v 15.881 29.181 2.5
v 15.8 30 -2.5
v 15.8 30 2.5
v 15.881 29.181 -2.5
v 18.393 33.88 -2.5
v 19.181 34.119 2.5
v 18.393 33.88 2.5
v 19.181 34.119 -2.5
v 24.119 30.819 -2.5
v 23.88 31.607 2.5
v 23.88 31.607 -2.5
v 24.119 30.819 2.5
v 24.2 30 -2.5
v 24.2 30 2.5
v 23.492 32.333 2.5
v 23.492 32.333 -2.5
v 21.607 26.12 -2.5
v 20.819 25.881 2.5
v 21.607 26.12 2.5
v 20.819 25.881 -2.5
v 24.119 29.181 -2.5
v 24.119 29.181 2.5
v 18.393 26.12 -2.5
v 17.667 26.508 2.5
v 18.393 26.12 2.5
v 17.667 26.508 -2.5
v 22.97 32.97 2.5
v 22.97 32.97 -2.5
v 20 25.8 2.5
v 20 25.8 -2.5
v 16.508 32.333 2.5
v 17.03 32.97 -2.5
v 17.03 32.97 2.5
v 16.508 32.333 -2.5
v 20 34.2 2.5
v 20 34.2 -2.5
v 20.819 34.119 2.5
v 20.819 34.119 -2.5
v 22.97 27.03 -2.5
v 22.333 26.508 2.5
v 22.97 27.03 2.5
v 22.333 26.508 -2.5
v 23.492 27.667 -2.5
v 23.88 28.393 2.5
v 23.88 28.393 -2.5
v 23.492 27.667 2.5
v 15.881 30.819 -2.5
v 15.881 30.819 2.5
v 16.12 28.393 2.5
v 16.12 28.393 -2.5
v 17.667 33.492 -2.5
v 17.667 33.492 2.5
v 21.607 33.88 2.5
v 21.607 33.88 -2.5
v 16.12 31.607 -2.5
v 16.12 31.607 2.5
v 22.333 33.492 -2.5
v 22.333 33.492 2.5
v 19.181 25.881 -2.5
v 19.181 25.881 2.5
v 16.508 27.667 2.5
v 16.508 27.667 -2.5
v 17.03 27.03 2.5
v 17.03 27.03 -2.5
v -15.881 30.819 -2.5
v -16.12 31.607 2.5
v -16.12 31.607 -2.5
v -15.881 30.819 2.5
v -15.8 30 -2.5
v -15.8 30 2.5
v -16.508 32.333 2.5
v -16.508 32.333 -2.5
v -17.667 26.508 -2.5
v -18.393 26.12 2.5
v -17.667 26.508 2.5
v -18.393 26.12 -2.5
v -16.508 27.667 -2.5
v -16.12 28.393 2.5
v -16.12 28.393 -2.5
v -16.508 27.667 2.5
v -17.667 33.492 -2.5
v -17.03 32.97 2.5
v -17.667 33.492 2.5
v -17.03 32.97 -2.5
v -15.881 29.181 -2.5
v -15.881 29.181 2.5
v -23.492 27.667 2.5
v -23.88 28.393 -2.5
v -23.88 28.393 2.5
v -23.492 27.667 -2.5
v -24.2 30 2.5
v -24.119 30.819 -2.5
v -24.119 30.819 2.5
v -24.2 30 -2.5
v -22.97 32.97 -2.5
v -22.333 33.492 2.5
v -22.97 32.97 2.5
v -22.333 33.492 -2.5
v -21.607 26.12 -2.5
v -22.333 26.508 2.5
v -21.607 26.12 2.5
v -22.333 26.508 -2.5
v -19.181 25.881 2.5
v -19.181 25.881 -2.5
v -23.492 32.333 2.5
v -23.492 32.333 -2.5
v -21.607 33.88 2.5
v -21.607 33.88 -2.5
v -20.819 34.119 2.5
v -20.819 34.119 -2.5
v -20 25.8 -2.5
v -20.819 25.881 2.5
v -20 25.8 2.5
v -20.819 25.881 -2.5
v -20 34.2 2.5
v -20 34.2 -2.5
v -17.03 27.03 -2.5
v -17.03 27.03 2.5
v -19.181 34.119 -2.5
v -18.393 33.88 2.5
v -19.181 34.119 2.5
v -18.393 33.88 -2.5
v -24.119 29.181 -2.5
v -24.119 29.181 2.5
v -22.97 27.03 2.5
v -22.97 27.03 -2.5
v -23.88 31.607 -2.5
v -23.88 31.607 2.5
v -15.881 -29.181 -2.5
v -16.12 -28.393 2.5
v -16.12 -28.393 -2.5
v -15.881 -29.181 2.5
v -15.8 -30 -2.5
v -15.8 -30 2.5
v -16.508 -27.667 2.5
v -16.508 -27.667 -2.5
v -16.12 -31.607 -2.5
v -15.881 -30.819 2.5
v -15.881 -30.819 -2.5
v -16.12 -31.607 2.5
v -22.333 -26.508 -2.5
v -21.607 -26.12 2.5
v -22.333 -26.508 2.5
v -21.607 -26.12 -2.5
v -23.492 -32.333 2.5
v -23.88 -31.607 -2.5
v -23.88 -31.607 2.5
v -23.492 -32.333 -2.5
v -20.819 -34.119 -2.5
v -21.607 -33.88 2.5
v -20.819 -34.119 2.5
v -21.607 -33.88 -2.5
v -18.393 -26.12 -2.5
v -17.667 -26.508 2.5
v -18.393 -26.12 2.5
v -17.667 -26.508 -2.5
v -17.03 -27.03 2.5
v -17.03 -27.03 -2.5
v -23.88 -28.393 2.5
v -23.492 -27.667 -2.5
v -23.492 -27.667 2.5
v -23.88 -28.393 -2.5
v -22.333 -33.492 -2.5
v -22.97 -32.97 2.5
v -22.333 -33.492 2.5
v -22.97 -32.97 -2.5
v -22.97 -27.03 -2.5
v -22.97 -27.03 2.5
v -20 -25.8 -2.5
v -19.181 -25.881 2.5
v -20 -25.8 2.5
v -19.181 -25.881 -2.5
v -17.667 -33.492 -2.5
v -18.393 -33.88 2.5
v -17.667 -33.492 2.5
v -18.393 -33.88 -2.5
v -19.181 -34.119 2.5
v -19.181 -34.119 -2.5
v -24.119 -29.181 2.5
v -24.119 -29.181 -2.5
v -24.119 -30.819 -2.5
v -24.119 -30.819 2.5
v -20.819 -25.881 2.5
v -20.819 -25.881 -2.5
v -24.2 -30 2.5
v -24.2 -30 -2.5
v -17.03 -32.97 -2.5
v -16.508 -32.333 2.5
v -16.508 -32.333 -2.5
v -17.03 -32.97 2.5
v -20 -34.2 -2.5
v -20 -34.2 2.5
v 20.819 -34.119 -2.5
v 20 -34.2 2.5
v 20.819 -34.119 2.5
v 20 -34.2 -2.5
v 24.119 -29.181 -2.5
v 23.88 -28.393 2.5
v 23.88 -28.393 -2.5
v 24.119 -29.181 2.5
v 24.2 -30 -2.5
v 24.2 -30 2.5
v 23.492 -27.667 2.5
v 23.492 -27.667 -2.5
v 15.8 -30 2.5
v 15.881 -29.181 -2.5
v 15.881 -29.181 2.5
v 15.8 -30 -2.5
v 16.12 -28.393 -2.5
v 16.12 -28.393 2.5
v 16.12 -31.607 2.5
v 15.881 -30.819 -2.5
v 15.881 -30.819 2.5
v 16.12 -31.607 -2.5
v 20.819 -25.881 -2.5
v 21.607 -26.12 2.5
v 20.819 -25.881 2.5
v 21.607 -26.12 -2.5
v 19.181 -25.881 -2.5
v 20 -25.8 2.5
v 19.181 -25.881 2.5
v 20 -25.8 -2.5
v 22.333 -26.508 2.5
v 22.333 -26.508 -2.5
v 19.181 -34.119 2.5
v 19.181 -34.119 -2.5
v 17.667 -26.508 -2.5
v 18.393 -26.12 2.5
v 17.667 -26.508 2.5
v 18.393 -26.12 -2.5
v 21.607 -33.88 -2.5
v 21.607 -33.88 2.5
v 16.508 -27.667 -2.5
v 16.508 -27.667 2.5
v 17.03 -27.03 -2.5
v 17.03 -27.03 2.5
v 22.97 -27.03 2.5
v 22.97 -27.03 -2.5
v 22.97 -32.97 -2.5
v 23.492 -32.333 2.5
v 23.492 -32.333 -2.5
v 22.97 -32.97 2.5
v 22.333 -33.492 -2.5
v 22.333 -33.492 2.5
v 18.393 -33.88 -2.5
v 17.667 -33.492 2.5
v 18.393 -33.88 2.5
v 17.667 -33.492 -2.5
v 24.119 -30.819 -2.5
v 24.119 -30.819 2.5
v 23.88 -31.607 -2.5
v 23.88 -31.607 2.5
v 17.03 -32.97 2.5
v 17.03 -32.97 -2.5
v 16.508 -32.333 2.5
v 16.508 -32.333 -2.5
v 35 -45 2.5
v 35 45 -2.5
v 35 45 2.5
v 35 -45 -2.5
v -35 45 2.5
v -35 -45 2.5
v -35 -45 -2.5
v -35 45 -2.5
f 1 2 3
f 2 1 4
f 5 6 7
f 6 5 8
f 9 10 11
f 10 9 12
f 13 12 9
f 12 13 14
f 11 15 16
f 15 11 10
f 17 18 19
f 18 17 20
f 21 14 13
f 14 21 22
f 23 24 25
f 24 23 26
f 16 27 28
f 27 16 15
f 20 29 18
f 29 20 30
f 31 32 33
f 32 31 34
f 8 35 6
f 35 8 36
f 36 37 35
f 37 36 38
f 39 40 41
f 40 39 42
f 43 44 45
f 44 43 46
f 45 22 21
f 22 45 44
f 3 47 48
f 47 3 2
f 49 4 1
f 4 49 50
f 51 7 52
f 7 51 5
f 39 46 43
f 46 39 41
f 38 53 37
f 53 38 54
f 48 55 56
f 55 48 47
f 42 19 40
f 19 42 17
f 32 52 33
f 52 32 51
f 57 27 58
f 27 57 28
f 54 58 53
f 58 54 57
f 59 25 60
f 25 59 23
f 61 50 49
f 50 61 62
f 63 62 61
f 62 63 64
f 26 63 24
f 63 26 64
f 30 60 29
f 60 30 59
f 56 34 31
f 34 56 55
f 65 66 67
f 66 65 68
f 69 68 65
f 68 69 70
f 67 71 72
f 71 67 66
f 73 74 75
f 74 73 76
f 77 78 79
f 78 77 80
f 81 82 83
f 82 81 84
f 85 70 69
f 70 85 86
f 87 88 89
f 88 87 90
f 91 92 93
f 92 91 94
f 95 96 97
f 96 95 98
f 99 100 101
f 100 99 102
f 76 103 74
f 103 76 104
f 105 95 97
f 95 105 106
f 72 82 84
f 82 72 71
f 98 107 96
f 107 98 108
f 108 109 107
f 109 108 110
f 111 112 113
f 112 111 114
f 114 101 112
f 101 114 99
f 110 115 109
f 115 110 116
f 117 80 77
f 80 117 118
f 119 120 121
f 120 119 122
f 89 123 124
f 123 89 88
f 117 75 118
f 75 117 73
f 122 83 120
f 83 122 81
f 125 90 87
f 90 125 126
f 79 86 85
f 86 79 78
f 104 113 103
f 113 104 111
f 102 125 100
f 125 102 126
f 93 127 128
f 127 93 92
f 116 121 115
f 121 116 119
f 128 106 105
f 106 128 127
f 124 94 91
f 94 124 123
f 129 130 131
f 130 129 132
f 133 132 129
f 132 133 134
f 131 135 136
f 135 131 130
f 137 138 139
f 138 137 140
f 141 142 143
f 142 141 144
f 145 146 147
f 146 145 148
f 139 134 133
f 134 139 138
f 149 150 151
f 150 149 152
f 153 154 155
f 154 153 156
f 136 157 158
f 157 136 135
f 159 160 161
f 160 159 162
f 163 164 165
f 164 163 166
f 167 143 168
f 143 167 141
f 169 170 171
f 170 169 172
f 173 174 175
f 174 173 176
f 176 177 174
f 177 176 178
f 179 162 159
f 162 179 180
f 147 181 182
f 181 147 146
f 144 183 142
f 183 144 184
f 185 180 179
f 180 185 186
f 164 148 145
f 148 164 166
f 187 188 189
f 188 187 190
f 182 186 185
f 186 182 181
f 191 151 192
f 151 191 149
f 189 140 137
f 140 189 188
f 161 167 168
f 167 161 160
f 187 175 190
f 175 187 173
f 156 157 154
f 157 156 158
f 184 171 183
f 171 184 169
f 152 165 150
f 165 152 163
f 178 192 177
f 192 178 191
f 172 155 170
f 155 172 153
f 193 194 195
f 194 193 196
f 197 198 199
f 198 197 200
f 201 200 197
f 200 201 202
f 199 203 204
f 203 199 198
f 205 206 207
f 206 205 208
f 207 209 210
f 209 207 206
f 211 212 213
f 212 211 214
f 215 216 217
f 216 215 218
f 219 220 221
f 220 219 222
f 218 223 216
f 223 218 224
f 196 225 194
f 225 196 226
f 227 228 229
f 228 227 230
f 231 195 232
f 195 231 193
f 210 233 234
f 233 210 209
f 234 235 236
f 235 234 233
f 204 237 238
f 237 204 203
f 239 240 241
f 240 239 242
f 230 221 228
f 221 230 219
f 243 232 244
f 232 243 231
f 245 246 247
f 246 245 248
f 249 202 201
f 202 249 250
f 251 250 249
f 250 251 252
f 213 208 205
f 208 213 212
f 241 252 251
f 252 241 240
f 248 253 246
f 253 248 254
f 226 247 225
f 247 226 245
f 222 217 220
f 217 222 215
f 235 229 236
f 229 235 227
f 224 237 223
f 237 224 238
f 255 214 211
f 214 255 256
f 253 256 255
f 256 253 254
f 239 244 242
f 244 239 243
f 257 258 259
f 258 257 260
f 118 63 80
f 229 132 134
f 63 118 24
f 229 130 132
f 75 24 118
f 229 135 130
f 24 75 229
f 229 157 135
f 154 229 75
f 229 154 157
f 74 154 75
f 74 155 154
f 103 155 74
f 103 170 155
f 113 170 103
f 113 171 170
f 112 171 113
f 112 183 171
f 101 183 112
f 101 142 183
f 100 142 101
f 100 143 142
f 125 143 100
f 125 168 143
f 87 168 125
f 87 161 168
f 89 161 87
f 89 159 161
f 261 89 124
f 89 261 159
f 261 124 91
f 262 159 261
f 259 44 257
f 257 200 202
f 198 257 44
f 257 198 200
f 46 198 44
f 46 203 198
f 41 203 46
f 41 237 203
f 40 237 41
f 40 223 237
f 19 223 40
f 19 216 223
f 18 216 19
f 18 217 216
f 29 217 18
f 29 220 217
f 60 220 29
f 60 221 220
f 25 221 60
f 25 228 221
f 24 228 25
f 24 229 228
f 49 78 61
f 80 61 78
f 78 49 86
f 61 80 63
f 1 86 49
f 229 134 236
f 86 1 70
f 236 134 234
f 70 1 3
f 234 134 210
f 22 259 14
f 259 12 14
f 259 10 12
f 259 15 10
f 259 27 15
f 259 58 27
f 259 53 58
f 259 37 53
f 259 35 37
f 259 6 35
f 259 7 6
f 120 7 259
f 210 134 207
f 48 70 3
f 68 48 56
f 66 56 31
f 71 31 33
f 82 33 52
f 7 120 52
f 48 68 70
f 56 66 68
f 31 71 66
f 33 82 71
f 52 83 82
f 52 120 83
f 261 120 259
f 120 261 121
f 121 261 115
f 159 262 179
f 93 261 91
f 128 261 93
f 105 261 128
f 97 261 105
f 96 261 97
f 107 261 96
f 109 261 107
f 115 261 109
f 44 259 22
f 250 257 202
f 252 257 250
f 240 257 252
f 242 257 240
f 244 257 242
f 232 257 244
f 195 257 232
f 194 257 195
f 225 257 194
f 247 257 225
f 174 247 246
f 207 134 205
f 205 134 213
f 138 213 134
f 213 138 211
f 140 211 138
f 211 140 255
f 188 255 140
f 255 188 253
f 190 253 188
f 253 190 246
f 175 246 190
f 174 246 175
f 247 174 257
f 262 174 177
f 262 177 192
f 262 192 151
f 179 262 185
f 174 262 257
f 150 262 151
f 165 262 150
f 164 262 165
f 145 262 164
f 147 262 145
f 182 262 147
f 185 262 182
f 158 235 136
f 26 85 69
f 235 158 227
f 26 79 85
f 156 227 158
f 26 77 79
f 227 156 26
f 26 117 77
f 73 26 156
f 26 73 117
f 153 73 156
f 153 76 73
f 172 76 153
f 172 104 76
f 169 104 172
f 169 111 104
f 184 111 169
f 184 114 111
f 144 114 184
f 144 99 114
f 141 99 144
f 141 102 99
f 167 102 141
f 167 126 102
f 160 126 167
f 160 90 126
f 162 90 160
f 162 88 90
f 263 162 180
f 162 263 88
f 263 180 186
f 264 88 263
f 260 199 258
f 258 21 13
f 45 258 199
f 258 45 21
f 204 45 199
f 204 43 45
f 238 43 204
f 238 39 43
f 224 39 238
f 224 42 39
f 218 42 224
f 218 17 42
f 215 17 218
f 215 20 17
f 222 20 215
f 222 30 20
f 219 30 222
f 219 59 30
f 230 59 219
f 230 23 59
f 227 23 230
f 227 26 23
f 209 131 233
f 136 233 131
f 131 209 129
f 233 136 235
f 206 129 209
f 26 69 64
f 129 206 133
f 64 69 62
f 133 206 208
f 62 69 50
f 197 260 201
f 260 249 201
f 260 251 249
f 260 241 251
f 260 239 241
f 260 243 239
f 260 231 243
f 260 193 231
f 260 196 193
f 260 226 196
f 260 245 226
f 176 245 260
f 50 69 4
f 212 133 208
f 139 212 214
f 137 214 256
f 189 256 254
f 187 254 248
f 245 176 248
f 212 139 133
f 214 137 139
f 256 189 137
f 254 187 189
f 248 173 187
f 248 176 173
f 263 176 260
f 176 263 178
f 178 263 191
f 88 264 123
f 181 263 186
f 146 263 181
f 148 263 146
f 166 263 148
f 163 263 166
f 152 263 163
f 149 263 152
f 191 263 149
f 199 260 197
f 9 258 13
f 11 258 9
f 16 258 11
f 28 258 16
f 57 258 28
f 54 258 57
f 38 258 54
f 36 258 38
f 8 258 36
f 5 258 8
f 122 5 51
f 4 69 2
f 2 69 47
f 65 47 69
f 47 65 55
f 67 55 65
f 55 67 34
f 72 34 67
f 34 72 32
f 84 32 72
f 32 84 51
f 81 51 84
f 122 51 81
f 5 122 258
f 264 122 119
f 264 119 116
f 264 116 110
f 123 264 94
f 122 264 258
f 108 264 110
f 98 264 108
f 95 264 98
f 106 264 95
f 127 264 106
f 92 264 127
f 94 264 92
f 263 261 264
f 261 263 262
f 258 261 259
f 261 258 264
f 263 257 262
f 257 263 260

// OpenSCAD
$fn = 32;

// ----------------------------------------------------------------------
// Corner plate 70 x 90 x 5
// 4 holes, centres taken from the edge offset
// ----------------------------------------------------------------------

// --- parameters (mm) ---
plate = [70, 90, 5];  // overall size (x, y, z)
holes = 4;            // number of holes the drawing asks for
hole_d = 8.4;         // hole diameter
edge = 15;            // hole centre offset from the plate edge

// --- derived feature positions (mm) ---
corner_x = plate[0] / 2 - edge;  // = 20   corner hole X
corner_y = plate[1] / 2 - edge;  // = 30   corner hole Y
feature_centers = [
  [corner_x, corner_y],
  [-corner_x, corner_y],
  [-corner_x, -corner_y],
  [corner_x, -corner_y]
];   // hole centres the loop below drills

// plate outline, every hole drilled through with the same cutters
difference() {
  cube(plate, center = true);
  for (centre = feature_centers)
    translate([centre[0], centre[1], 0])
      cylinder(d = hole_d, h = plate[2] + 2, center = true);
}
